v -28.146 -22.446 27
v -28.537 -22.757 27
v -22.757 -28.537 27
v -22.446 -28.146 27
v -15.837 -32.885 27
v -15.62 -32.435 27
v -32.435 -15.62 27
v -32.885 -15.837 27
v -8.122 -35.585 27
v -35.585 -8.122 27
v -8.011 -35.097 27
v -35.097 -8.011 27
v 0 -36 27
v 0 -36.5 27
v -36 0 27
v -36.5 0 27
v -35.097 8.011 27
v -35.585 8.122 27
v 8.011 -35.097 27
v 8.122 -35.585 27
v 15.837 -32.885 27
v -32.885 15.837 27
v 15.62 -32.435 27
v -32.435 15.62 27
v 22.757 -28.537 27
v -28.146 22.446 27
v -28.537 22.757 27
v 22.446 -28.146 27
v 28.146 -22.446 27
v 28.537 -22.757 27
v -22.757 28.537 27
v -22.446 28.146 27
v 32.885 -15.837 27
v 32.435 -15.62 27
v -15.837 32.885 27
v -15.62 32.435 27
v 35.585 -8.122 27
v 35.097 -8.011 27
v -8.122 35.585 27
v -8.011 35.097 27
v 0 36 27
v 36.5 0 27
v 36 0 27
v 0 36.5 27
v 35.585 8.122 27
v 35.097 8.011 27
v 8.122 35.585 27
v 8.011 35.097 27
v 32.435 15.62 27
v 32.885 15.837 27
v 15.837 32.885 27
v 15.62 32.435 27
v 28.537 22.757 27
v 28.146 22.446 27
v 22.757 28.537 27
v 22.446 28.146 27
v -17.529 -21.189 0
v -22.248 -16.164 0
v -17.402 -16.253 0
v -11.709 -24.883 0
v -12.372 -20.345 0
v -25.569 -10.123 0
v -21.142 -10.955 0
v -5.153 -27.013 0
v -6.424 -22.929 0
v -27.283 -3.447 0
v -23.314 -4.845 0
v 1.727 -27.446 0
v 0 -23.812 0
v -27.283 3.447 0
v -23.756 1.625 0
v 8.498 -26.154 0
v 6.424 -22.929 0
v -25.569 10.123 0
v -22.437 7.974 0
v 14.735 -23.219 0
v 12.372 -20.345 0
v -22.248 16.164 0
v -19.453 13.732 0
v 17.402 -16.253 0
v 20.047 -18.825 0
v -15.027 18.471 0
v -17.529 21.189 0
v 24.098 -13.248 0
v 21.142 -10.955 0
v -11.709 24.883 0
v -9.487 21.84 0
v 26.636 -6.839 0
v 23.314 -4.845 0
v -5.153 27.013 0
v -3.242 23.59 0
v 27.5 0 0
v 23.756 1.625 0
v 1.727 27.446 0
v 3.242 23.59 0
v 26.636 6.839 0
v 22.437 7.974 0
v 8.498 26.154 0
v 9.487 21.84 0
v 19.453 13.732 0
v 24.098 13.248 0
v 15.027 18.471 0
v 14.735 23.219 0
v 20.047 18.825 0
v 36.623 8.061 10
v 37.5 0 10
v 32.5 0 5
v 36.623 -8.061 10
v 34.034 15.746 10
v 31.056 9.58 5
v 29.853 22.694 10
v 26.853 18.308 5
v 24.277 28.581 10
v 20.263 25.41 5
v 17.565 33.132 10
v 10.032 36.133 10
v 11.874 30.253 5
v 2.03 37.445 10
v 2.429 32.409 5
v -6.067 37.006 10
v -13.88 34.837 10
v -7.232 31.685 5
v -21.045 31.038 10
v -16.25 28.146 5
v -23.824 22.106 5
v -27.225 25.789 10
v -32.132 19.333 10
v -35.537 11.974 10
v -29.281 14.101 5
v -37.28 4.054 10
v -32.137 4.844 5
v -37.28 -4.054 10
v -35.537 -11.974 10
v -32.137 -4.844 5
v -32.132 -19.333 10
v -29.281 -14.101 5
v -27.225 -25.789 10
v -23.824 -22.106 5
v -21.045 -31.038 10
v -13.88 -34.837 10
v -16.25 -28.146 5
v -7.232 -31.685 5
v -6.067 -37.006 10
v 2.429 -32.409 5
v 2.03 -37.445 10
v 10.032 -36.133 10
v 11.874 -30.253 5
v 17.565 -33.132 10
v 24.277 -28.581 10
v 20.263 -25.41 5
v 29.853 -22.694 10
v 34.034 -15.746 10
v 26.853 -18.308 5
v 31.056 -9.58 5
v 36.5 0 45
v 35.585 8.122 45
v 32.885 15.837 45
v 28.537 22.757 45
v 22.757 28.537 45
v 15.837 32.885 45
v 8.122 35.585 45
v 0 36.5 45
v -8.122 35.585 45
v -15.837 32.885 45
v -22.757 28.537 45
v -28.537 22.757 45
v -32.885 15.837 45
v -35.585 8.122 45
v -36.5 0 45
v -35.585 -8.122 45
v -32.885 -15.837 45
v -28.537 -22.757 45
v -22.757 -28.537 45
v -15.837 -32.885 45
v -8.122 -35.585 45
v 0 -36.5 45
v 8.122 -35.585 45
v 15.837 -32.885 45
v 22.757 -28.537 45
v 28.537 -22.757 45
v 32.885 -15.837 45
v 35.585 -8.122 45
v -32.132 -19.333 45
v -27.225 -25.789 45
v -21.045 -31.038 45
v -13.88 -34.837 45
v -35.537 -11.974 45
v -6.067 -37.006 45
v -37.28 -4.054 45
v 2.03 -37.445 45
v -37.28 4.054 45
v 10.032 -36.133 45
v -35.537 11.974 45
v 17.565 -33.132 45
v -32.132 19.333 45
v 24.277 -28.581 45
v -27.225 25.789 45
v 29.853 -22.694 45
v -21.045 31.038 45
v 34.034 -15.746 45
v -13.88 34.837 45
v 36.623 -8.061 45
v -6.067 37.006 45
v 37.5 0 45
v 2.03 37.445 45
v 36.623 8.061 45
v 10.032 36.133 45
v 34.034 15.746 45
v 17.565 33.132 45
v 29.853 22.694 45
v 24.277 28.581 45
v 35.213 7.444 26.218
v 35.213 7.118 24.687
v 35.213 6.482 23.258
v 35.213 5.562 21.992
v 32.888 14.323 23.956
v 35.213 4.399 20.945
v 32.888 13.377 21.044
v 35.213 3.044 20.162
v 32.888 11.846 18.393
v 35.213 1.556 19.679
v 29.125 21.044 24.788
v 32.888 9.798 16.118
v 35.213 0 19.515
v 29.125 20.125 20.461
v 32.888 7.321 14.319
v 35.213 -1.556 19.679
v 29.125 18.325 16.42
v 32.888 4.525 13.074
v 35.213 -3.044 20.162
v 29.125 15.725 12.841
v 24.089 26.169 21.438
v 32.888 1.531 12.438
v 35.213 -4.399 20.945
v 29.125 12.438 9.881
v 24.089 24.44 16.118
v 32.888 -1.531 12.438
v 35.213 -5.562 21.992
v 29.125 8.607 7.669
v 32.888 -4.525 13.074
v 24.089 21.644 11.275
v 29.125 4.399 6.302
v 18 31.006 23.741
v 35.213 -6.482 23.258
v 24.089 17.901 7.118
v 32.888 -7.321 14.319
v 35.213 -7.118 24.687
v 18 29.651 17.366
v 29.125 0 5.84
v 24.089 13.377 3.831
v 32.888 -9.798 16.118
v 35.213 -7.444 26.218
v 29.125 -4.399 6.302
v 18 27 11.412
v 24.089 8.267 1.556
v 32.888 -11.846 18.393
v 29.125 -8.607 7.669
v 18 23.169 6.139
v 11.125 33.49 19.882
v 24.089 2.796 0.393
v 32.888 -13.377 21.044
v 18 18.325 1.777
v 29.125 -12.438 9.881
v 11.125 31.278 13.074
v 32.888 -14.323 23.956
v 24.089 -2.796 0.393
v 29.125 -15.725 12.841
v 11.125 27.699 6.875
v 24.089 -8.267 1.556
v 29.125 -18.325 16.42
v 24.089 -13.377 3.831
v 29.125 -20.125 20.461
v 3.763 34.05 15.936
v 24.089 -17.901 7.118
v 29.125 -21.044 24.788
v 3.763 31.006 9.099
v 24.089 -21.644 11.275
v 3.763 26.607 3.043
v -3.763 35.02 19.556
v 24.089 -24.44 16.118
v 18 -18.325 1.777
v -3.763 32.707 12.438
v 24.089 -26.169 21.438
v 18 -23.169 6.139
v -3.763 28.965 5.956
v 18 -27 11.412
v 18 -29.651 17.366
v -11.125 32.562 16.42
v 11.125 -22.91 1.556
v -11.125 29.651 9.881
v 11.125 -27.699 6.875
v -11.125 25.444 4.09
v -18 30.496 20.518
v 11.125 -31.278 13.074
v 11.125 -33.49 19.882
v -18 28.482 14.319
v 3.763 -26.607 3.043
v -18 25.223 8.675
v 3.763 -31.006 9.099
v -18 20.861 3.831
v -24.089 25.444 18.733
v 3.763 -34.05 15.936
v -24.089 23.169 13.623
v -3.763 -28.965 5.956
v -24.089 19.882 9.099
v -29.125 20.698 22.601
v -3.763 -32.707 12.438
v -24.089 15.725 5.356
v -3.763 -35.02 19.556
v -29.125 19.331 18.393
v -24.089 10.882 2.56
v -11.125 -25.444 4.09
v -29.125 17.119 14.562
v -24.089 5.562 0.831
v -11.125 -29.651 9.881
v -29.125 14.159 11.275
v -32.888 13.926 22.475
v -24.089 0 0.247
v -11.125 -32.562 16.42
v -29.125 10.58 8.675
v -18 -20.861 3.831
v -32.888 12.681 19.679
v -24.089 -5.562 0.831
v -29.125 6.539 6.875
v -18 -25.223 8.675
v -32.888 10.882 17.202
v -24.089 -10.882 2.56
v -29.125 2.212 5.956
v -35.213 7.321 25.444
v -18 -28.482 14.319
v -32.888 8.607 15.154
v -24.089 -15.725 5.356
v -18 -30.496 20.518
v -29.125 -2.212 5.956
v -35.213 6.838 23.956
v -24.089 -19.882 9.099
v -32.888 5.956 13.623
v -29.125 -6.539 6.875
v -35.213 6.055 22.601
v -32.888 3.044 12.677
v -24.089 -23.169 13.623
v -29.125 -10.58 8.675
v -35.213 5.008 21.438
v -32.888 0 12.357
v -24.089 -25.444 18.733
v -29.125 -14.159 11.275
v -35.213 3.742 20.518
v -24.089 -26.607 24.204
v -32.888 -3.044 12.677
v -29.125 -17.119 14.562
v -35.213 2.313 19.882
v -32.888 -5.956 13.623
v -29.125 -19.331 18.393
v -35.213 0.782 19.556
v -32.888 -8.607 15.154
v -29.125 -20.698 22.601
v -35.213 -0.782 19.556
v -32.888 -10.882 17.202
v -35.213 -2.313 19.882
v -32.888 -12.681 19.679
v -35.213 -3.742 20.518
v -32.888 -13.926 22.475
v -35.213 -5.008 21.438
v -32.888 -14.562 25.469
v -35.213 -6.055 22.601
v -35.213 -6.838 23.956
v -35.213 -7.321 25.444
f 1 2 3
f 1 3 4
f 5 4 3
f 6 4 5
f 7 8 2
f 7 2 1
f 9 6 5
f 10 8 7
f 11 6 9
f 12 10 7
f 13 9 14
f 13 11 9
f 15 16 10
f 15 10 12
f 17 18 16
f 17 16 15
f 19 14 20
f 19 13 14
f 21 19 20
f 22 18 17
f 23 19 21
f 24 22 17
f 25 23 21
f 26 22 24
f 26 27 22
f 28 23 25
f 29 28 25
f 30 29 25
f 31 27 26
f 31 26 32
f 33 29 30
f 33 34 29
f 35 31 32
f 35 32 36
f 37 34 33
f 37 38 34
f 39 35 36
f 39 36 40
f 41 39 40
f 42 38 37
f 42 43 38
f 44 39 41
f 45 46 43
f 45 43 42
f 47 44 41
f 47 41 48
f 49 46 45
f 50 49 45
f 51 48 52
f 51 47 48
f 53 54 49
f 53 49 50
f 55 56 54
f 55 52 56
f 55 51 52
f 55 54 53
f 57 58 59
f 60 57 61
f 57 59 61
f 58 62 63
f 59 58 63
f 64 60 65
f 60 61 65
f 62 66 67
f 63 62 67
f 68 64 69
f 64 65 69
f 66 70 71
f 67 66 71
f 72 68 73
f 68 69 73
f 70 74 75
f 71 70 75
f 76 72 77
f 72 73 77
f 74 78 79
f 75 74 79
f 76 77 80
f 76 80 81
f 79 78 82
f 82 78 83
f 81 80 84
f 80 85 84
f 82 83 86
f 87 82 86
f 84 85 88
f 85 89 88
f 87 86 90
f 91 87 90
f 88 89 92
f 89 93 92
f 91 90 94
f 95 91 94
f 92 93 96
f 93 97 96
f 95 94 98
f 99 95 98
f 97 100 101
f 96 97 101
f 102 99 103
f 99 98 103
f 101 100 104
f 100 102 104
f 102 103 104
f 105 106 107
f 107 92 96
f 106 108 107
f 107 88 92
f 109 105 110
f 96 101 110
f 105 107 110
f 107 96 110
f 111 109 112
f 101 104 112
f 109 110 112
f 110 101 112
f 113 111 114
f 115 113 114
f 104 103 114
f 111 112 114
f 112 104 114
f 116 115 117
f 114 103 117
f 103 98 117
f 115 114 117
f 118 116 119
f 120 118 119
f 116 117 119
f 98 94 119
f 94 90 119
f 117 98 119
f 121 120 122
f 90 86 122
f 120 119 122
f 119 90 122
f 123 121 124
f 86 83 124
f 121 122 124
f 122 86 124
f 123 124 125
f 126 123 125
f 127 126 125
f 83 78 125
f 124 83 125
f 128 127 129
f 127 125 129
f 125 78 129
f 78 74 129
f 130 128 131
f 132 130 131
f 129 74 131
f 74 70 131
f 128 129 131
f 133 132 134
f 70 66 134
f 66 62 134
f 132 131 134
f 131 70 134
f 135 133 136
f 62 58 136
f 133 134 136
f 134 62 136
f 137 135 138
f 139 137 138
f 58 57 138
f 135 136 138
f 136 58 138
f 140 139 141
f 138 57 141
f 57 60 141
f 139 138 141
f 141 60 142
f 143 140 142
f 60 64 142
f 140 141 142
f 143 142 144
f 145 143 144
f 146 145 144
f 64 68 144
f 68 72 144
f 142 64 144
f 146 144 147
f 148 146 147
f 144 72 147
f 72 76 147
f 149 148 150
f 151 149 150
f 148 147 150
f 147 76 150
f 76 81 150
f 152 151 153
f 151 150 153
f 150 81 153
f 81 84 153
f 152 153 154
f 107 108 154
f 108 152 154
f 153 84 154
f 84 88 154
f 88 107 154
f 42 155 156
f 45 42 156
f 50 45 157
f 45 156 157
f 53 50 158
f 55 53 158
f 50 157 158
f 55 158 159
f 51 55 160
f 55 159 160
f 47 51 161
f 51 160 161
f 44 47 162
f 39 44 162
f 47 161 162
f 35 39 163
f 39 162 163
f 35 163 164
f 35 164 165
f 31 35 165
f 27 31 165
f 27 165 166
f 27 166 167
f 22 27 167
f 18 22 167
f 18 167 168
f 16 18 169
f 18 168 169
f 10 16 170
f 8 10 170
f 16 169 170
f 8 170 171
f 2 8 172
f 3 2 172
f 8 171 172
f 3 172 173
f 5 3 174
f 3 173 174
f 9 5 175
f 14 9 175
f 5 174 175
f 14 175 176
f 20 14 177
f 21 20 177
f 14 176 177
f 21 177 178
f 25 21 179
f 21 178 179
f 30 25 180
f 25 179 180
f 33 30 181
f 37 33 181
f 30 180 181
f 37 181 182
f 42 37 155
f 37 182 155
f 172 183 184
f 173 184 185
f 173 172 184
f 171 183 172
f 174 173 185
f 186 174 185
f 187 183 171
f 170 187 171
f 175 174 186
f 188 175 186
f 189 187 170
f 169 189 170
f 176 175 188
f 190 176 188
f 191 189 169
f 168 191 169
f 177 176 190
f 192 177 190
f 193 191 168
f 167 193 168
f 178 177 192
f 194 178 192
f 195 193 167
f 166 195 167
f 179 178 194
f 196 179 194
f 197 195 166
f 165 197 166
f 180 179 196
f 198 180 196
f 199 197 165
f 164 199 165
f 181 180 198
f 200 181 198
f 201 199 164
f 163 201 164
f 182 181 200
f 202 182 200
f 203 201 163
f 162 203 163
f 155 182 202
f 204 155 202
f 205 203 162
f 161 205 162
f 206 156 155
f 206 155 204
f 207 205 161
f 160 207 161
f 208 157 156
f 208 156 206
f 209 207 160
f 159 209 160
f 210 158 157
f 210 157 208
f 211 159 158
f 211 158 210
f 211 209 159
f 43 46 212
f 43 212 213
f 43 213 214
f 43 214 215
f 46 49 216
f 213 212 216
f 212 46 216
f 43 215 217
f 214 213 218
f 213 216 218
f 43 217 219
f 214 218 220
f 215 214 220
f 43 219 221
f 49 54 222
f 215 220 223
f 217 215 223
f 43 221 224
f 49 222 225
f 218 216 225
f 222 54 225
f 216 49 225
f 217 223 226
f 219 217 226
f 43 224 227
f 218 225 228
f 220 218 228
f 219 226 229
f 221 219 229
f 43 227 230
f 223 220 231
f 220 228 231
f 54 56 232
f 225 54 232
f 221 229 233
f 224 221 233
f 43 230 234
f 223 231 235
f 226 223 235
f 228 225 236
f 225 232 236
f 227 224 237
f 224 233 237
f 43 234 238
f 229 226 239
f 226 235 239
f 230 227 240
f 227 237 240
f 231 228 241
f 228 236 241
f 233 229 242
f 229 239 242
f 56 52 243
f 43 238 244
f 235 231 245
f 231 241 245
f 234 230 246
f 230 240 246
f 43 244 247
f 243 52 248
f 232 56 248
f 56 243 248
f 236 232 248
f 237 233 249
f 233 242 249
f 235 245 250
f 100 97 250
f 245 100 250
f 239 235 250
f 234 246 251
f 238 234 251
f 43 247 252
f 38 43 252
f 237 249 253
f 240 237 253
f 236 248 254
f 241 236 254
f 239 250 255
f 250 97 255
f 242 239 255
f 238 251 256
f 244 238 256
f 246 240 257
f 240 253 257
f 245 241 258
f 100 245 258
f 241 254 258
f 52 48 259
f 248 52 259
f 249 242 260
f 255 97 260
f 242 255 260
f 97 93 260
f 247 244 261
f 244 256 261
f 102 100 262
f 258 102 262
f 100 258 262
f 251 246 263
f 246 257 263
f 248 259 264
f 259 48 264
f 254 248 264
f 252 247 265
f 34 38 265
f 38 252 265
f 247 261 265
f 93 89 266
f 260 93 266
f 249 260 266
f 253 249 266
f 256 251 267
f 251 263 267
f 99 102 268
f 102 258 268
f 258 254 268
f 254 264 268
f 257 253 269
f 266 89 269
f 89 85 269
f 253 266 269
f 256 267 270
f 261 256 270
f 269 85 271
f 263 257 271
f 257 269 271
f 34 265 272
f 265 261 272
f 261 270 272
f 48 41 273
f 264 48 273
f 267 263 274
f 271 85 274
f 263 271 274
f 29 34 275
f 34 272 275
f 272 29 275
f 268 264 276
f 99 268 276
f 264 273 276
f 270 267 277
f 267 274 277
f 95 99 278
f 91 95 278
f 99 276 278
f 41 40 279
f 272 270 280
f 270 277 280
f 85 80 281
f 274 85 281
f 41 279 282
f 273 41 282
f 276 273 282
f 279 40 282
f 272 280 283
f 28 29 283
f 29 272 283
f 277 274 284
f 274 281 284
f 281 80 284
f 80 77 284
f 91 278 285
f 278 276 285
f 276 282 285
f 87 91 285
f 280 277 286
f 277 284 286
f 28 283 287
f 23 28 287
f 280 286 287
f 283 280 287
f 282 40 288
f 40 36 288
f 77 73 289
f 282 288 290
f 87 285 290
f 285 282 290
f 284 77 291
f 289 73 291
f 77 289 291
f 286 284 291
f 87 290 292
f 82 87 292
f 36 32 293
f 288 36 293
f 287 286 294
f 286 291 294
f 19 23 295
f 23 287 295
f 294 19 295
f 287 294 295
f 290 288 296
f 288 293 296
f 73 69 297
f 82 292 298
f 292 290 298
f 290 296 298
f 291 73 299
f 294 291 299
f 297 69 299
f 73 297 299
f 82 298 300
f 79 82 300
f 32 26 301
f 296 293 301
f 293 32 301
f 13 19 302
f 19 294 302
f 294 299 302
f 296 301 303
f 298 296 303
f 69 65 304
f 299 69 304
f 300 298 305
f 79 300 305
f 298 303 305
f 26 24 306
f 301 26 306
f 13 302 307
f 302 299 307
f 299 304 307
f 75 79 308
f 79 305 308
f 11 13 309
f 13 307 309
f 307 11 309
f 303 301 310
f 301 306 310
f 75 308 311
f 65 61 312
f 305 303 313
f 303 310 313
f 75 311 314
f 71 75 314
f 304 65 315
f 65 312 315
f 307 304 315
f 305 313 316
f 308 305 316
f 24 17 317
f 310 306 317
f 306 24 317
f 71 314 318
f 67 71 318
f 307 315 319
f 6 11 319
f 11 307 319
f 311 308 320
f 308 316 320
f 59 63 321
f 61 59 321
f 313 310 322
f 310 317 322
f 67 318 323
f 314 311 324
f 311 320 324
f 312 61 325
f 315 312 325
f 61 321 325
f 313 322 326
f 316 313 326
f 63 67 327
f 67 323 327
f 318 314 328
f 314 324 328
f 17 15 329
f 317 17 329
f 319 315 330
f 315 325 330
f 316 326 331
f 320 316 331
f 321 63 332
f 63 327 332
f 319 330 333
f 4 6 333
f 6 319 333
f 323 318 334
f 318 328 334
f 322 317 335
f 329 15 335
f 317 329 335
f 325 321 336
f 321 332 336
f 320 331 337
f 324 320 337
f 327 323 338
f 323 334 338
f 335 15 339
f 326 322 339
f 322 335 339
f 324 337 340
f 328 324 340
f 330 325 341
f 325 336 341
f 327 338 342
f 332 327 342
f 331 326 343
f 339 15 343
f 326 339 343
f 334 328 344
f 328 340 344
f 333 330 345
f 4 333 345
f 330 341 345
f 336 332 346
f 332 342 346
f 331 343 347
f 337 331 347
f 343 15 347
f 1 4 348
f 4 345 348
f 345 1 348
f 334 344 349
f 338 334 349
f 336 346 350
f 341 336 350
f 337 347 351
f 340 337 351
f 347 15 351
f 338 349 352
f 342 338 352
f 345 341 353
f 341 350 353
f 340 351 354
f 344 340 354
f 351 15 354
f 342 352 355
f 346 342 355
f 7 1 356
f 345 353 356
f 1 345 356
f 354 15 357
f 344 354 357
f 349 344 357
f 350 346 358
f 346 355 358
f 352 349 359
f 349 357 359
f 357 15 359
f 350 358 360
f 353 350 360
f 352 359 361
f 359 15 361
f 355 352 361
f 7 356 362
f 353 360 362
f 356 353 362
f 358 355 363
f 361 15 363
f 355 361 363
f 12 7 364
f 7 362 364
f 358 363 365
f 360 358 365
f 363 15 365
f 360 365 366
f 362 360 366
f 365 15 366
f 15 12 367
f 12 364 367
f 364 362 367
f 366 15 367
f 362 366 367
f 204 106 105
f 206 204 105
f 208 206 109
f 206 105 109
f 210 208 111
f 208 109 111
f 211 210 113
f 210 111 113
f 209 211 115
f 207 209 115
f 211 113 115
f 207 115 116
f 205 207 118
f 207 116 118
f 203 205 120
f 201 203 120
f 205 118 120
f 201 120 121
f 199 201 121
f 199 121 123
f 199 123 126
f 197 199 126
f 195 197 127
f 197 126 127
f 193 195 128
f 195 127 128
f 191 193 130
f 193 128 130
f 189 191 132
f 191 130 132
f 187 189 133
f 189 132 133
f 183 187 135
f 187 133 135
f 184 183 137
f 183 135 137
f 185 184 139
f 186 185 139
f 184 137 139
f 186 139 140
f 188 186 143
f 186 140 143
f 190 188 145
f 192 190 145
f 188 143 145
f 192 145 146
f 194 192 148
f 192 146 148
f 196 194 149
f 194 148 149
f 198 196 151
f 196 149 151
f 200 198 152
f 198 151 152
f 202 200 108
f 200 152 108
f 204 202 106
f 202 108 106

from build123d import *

# Parameters (mm, degrees)
SKETCH1_R           = 37.5
BOSS_EXTRUDE1_DEPTH = 45
SKETCH5_R           = 36.5
CUT_EXTRUDE2_DEPTH  = 18
CUT_REVOLVE3_ANGLE  = 180
CHAMFER1_SIZE       = 10


with BuildPart() as part:
    # Sketch1 → Boss-Extrude1 (new body)
    with BuildSketch(Plane.XY):
        Circle(SKETCH1_R)
    extrude(amount=BOSS_EXTRUDE1_DEPTH)

    # Sketch5 → Cut-Extrude2 (cut)
    with BuildSketch(Plane.XY.offset(45)):
        Circle(SKETCH5_R)
    extrude(amount=-CUT_EXTRUDE2_DEPTH, mode=Mode.SUBTRACT)

    # Sketch7 → Cut-Revolve3 (revolve, cut)
    with BuildSketch(Plane.XY.offset(27)):
        with BuildLine():
            Line((-36, 0), (36, 0))
            ThreePointArc((36, 0), (0, 36), (-36, 0))
        make_face()
    revolve(axis=Axis((-36, 0, 27), (-1, 0, 0)), revolution_arc=CUT_REVOLVE3_ANGLE, mode=Mode.SUBTRACT)

    # Chamfer1
    chamfer1_edges = [part.edges().sort_by_distance(p)[0] for p in [
        (-37.5, 0, 0),
    ]]
    chamfer(chamfer1_edges, length=CHAMFER1_SIZE)


solid = part.part
